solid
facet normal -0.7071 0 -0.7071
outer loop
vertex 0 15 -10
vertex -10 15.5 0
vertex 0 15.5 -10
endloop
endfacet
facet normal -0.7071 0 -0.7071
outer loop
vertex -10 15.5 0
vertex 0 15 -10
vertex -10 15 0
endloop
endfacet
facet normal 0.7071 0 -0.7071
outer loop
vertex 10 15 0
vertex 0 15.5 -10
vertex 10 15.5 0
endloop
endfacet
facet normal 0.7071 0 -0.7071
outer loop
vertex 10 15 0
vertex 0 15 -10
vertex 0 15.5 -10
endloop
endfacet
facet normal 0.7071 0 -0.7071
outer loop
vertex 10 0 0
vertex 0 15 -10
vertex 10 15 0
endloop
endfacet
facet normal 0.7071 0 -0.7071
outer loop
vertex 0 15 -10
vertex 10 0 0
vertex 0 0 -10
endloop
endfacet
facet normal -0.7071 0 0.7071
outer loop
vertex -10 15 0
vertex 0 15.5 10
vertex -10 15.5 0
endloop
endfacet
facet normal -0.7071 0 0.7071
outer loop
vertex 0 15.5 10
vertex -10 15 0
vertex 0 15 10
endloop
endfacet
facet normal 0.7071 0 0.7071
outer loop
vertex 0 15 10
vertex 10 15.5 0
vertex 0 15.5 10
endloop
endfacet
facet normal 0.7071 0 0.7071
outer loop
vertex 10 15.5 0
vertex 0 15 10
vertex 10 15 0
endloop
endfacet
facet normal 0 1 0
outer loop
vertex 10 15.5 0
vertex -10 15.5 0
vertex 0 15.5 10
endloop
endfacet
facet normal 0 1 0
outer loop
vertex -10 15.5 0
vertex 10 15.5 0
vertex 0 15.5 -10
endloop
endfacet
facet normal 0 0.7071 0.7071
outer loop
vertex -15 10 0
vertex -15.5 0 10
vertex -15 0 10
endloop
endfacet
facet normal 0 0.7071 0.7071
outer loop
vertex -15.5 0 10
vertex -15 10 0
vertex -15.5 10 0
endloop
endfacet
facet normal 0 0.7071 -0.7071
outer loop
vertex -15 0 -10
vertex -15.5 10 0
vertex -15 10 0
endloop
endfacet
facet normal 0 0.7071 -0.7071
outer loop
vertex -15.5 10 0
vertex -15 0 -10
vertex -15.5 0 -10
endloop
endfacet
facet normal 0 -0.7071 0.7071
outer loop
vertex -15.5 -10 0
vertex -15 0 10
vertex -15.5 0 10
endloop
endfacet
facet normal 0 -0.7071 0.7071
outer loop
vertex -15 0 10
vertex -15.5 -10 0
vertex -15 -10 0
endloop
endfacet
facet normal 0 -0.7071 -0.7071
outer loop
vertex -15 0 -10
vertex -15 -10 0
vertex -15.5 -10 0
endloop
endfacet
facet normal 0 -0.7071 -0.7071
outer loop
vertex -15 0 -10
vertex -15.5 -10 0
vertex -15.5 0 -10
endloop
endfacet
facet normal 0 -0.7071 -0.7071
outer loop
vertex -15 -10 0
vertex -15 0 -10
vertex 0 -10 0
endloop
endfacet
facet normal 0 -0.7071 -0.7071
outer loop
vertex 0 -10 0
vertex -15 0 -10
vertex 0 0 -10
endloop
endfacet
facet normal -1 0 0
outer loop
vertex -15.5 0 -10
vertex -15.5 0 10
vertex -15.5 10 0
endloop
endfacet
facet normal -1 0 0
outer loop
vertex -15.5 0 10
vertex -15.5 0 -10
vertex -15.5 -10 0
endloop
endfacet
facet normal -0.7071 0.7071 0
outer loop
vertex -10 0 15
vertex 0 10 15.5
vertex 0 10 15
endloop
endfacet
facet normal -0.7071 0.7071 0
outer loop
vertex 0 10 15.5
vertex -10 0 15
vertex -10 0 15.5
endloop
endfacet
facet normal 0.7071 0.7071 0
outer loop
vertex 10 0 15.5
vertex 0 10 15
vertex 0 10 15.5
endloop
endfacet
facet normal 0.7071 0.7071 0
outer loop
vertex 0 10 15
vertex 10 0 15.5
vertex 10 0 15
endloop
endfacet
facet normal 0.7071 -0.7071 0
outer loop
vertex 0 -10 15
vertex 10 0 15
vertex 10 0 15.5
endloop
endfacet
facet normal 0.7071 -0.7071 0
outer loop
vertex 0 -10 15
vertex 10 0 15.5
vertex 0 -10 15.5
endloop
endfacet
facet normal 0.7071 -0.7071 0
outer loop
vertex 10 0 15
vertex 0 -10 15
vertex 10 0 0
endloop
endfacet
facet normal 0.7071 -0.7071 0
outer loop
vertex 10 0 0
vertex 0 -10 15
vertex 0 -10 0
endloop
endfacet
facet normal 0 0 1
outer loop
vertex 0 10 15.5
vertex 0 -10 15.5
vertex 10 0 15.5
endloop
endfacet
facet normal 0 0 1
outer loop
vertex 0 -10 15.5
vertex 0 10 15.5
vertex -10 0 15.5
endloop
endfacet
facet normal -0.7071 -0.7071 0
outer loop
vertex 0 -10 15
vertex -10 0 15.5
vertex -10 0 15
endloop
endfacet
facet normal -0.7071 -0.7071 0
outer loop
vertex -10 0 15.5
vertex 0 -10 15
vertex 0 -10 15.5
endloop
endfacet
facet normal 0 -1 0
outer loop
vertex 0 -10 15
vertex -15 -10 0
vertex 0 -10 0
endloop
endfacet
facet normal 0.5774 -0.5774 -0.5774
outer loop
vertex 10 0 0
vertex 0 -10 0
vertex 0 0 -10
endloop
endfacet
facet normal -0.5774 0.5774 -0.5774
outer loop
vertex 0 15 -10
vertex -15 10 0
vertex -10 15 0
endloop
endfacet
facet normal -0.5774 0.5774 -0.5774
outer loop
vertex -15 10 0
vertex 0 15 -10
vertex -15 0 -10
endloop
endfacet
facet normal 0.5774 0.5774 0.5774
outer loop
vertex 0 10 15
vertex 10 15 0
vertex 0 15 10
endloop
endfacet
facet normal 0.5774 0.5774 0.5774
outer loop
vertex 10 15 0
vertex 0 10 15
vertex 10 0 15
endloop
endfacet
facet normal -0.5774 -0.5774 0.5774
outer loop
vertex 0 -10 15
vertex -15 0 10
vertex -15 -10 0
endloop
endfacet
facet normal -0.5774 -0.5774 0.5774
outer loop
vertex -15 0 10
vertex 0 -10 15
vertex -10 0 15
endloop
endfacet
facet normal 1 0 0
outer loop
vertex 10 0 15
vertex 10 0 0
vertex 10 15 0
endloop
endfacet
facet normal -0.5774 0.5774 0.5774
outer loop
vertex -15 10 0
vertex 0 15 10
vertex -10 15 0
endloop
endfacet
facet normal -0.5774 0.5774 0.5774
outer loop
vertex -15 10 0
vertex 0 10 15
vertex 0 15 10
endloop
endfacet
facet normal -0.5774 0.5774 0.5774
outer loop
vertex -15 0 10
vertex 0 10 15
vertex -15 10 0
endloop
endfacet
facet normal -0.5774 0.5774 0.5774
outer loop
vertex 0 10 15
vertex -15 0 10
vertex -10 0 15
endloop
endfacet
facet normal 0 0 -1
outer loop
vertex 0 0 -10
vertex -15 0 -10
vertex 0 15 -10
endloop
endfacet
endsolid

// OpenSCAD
module dieShape(out) {
  rotate([-90,90,0]) cylinder(r=10,h=15+out, $fn=4);
  rotate([0,-90,0]) cylinder(r=10,h=15+out, $fn=4);
  rotate([0,0,0]) cylinder(r=10,h=15+out, $fn=4);
}

hull() dieShape(0);
dieShape(.5);
